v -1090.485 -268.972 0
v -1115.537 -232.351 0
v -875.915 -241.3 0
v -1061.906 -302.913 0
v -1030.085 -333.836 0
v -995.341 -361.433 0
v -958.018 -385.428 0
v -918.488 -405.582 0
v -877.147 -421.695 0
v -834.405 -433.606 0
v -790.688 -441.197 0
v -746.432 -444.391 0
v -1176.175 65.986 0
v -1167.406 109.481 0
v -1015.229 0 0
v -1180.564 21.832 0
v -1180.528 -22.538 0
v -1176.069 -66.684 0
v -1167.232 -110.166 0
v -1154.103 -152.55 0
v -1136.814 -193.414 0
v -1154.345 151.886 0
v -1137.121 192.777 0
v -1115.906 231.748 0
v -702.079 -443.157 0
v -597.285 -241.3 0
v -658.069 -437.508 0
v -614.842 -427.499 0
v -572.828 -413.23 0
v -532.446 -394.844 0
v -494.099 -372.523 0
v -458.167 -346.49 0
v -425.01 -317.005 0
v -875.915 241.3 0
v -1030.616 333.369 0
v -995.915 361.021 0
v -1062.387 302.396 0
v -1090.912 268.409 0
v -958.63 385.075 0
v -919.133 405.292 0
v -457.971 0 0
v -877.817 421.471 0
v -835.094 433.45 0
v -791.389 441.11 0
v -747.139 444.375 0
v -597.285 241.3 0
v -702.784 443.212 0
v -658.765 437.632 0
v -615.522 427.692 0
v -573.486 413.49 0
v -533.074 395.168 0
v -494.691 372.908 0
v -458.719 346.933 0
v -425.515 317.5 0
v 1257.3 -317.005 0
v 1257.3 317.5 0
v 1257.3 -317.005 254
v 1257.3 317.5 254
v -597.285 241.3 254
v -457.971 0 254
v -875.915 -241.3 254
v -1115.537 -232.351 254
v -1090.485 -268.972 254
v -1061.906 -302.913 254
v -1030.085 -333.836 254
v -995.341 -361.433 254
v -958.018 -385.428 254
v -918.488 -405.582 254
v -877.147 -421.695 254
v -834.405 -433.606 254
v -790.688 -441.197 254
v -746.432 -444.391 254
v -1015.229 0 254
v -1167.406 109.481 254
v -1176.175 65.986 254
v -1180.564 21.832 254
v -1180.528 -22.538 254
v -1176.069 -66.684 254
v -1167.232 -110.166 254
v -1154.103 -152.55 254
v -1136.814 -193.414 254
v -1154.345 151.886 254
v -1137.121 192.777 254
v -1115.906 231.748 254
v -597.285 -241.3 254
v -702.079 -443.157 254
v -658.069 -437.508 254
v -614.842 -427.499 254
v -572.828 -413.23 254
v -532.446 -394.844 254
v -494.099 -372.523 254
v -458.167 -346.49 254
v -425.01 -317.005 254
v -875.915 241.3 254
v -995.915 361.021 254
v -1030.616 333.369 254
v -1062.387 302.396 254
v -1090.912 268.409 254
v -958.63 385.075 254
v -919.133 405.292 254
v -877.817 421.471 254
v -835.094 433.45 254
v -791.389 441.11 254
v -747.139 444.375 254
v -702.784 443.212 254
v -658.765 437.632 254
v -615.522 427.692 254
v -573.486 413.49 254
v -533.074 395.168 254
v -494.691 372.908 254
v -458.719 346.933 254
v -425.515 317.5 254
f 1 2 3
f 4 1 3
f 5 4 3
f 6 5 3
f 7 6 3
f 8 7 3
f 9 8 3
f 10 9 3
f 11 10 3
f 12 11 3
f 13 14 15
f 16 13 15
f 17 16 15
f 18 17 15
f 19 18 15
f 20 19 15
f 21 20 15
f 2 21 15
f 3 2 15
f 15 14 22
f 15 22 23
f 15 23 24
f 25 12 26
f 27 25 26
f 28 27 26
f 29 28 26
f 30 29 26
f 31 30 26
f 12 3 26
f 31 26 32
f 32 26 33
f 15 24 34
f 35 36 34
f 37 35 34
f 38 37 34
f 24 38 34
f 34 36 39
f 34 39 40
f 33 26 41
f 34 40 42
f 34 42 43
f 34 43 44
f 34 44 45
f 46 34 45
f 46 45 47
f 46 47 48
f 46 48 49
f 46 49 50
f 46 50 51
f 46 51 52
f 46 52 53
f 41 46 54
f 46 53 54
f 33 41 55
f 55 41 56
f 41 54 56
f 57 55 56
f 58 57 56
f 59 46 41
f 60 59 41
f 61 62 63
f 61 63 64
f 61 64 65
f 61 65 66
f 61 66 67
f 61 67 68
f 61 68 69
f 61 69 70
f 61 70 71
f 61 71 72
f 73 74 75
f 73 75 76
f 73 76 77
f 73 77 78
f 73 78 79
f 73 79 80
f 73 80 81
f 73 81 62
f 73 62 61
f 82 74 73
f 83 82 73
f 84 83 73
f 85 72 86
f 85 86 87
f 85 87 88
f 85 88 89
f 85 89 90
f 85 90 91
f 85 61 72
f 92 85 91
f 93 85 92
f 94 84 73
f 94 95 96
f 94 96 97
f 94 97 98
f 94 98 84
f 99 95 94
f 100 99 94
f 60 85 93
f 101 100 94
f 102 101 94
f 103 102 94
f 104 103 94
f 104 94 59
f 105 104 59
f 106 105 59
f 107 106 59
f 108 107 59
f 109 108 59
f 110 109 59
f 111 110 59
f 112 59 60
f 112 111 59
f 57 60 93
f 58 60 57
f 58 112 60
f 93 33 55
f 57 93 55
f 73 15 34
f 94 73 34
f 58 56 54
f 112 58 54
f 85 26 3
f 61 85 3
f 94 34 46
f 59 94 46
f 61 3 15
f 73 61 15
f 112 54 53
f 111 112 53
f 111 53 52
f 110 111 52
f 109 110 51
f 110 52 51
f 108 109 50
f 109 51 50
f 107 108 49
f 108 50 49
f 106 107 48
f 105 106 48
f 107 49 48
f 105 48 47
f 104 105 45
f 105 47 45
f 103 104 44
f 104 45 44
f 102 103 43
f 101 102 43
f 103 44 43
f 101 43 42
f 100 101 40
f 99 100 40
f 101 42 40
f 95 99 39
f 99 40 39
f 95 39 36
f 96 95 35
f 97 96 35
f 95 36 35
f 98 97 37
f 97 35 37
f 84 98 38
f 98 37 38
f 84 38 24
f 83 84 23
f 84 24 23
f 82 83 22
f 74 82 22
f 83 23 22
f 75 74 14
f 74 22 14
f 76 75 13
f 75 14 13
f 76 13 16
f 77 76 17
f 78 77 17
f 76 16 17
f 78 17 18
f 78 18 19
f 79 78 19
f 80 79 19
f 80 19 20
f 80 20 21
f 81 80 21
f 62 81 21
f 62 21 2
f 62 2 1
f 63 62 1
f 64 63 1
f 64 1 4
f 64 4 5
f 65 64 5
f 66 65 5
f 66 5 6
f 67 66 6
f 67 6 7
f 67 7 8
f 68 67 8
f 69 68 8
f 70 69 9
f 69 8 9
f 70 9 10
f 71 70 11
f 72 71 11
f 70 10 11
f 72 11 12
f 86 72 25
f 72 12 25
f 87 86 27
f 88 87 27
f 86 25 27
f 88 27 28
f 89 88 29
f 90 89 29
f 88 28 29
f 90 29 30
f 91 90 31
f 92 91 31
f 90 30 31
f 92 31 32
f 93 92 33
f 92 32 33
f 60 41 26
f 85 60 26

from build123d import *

# Parameters (mm, degrees)
F0_W     = 1257.3
F0_H     = 634.5049866525
F1_DEPTH = 254


# Not quite as in the source:
# - a feature names something its author has since deleted; it is built from what else it names


with BuildPart() as f1:
    # F0 (on Top) → F1 (new body)
    with BuildSketch(Plane.XY):
        with BuildLine():
            ThreePointArc((-425.0103845802, -317.0049866525), (-326.6720587383, -171.8701049425), (-292.1, 0))
            ThreePointArc((-292.1, 0), (-326.8088213402, 172.1959345996), (-425.5148026665, 317.5))
            ThreePointArc((-425.5148026665, 317.5), (-1181.09985954, -0.3533680164), (-425.0103845802, -317.0049866525))
        make_face()
        Polygon((-875.9146199555, 241.3), (-597.2853800445, 241.3), (-457.9707600891, 0), (-597.2853800445, -241.3), (-875.9146199555, -241.3), (-1015.2292399109, 0), align=None, mode=Mode.SUBTRACT)
        with Locations((628.65, 0.2475066738)):
            Rectangle(F0_W, F0_H)
        with BuildLine():
            ThreePointArc((-425.5148026665, 317.5), (-326.8088213402, 172.1959345996), (-292.1, 0))
            ThreePointArc((-292.1, 0), (-326.6720587383, -171.8701049425), (-425.0103845802, -317.0049866525))
            Line((-425.0103845802, -317.0049866525), (0, -317.0049866525))
            Line((0, -317.0049866525), (0, 317.5))
            Line((0, 317.5), (-425.5148026665, 317.5))
        make_face()
    extrude(amount=F1_DEPTH)


solid = f1.part
